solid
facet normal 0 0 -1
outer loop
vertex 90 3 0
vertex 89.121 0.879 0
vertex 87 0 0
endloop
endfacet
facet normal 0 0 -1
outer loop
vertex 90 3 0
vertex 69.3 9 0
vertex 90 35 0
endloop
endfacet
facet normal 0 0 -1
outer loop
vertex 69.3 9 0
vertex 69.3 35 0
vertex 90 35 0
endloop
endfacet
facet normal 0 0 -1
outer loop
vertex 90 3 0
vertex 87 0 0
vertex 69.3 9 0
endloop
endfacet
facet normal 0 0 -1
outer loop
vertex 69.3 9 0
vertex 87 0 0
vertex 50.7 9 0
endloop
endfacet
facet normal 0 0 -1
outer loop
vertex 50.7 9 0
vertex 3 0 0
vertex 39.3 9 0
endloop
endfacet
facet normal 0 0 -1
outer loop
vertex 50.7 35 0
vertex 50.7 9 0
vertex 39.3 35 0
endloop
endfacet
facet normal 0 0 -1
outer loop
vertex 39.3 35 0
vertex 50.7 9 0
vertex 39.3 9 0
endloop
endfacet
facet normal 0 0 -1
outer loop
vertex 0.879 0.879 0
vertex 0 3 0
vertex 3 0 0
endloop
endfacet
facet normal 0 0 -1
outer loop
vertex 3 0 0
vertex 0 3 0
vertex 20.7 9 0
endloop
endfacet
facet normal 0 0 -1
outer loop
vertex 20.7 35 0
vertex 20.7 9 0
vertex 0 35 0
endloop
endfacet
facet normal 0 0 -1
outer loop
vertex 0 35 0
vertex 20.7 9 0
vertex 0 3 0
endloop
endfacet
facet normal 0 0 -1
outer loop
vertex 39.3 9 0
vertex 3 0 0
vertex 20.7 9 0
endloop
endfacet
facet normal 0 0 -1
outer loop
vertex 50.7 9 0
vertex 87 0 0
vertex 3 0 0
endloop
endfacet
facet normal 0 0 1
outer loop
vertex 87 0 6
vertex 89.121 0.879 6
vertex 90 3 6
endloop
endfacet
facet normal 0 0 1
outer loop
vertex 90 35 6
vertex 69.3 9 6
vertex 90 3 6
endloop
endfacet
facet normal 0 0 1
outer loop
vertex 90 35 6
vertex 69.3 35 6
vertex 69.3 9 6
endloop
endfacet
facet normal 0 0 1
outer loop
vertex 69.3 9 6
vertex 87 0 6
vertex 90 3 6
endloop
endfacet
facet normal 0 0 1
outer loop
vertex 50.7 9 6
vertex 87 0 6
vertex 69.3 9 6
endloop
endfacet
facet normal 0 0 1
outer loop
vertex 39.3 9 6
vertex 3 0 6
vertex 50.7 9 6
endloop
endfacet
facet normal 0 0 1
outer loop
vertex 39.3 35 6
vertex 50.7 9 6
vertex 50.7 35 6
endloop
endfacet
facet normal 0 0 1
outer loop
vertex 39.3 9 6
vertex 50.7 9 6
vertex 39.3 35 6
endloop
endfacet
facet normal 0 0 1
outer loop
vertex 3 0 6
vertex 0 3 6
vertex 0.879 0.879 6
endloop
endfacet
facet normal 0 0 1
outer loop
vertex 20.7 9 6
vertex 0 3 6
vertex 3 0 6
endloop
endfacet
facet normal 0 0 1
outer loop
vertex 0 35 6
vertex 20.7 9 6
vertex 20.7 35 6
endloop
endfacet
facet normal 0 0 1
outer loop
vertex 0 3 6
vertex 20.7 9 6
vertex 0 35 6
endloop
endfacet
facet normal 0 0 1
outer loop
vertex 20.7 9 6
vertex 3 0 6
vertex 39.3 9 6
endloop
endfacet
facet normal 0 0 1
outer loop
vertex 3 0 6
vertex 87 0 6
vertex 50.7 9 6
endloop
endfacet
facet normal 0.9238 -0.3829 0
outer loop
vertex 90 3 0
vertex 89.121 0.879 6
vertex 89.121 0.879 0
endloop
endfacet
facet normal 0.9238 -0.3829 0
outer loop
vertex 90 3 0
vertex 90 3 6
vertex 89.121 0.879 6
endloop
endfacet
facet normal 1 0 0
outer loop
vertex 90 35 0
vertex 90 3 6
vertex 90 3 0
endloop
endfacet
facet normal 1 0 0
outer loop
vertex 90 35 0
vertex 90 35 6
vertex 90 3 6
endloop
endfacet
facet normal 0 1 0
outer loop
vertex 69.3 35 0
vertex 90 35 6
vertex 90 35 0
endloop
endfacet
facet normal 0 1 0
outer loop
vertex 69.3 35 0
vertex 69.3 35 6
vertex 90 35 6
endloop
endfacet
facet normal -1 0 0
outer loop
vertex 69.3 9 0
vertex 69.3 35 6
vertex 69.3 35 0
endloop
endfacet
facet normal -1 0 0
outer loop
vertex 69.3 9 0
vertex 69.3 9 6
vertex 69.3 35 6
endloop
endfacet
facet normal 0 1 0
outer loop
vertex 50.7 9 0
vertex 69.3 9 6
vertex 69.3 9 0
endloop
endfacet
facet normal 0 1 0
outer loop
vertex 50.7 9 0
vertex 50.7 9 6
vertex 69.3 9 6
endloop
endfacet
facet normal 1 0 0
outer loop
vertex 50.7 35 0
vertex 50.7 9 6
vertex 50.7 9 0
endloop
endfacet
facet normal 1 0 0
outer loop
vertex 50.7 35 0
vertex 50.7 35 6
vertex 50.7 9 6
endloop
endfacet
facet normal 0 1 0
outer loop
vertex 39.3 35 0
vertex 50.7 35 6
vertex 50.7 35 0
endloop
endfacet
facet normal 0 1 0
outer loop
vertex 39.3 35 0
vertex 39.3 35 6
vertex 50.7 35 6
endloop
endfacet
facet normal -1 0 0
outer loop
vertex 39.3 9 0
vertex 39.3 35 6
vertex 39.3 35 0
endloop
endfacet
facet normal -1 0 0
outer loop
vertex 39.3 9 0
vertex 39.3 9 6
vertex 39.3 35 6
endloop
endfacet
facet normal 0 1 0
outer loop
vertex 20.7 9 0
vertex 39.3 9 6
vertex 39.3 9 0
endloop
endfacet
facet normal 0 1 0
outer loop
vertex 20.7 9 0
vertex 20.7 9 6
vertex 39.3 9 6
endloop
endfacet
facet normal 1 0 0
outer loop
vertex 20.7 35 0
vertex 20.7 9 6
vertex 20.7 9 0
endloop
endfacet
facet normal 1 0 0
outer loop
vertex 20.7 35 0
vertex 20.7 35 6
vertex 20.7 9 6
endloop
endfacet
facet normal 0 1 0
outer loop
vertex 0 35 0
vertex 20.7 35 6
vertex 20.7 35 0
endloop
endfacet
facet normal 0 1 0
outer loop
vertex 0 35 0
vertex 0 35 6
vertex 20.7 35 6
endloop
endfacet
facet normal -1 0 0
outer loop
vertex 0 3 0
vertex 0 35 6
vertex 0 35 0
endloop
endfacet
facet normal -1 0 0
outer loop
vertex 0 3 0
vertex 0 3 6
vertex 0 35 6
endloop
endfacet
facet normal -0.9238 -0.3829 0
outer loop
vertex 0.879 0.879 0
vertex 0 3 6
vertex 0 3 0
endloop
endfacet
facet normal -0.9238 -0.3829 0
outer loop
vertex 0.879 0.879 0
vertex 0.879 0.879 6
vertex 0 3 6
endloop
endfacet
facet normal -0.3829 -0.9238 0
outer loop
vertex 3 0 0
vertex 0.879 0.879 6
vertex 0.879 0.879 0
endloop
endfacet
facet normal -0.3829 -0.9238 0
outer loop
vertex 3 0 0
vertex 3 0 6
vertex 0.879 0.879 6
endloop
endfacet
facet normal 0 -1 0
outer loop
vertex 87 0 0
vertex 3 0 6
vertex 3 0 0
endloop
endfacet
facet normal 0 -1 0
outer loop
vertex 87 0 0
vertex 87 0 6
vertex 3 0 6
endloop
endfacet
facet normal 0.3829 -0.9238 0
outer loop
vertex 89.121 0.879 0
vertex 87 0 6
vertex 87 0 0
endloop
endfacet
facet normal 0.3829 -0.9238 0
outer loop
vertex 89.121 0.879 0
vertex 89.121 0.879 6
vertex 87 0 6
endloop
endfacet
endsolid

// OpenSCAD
$fn = 32;

// ----------------------------------------------------------------------
// Window plate: 90 x 35 mm, 2 open windows
// ----------------------------------------------------------------------

// --- parameters (mm) ---
profile_height = 6;       // extrusion height
profile_points = 16;      // points of the closed outline

profile = [[0, 3], [0.879, 0.879], [3, 0], [87, 0], [89.121, 0.879], [90, 3], [90, 35], [69.3, 35], [69.3, 9], [50.7, 9], [50.7, 35], [39.3, 35], [39.3, 9], [20.7, 9], [20.7, 35], [0, 35]];  // single closed polygon, 16 points, counter clockwise

// --- the one profile operation ---
linear_extrude(height = profile_height) polygon(points = profile);
